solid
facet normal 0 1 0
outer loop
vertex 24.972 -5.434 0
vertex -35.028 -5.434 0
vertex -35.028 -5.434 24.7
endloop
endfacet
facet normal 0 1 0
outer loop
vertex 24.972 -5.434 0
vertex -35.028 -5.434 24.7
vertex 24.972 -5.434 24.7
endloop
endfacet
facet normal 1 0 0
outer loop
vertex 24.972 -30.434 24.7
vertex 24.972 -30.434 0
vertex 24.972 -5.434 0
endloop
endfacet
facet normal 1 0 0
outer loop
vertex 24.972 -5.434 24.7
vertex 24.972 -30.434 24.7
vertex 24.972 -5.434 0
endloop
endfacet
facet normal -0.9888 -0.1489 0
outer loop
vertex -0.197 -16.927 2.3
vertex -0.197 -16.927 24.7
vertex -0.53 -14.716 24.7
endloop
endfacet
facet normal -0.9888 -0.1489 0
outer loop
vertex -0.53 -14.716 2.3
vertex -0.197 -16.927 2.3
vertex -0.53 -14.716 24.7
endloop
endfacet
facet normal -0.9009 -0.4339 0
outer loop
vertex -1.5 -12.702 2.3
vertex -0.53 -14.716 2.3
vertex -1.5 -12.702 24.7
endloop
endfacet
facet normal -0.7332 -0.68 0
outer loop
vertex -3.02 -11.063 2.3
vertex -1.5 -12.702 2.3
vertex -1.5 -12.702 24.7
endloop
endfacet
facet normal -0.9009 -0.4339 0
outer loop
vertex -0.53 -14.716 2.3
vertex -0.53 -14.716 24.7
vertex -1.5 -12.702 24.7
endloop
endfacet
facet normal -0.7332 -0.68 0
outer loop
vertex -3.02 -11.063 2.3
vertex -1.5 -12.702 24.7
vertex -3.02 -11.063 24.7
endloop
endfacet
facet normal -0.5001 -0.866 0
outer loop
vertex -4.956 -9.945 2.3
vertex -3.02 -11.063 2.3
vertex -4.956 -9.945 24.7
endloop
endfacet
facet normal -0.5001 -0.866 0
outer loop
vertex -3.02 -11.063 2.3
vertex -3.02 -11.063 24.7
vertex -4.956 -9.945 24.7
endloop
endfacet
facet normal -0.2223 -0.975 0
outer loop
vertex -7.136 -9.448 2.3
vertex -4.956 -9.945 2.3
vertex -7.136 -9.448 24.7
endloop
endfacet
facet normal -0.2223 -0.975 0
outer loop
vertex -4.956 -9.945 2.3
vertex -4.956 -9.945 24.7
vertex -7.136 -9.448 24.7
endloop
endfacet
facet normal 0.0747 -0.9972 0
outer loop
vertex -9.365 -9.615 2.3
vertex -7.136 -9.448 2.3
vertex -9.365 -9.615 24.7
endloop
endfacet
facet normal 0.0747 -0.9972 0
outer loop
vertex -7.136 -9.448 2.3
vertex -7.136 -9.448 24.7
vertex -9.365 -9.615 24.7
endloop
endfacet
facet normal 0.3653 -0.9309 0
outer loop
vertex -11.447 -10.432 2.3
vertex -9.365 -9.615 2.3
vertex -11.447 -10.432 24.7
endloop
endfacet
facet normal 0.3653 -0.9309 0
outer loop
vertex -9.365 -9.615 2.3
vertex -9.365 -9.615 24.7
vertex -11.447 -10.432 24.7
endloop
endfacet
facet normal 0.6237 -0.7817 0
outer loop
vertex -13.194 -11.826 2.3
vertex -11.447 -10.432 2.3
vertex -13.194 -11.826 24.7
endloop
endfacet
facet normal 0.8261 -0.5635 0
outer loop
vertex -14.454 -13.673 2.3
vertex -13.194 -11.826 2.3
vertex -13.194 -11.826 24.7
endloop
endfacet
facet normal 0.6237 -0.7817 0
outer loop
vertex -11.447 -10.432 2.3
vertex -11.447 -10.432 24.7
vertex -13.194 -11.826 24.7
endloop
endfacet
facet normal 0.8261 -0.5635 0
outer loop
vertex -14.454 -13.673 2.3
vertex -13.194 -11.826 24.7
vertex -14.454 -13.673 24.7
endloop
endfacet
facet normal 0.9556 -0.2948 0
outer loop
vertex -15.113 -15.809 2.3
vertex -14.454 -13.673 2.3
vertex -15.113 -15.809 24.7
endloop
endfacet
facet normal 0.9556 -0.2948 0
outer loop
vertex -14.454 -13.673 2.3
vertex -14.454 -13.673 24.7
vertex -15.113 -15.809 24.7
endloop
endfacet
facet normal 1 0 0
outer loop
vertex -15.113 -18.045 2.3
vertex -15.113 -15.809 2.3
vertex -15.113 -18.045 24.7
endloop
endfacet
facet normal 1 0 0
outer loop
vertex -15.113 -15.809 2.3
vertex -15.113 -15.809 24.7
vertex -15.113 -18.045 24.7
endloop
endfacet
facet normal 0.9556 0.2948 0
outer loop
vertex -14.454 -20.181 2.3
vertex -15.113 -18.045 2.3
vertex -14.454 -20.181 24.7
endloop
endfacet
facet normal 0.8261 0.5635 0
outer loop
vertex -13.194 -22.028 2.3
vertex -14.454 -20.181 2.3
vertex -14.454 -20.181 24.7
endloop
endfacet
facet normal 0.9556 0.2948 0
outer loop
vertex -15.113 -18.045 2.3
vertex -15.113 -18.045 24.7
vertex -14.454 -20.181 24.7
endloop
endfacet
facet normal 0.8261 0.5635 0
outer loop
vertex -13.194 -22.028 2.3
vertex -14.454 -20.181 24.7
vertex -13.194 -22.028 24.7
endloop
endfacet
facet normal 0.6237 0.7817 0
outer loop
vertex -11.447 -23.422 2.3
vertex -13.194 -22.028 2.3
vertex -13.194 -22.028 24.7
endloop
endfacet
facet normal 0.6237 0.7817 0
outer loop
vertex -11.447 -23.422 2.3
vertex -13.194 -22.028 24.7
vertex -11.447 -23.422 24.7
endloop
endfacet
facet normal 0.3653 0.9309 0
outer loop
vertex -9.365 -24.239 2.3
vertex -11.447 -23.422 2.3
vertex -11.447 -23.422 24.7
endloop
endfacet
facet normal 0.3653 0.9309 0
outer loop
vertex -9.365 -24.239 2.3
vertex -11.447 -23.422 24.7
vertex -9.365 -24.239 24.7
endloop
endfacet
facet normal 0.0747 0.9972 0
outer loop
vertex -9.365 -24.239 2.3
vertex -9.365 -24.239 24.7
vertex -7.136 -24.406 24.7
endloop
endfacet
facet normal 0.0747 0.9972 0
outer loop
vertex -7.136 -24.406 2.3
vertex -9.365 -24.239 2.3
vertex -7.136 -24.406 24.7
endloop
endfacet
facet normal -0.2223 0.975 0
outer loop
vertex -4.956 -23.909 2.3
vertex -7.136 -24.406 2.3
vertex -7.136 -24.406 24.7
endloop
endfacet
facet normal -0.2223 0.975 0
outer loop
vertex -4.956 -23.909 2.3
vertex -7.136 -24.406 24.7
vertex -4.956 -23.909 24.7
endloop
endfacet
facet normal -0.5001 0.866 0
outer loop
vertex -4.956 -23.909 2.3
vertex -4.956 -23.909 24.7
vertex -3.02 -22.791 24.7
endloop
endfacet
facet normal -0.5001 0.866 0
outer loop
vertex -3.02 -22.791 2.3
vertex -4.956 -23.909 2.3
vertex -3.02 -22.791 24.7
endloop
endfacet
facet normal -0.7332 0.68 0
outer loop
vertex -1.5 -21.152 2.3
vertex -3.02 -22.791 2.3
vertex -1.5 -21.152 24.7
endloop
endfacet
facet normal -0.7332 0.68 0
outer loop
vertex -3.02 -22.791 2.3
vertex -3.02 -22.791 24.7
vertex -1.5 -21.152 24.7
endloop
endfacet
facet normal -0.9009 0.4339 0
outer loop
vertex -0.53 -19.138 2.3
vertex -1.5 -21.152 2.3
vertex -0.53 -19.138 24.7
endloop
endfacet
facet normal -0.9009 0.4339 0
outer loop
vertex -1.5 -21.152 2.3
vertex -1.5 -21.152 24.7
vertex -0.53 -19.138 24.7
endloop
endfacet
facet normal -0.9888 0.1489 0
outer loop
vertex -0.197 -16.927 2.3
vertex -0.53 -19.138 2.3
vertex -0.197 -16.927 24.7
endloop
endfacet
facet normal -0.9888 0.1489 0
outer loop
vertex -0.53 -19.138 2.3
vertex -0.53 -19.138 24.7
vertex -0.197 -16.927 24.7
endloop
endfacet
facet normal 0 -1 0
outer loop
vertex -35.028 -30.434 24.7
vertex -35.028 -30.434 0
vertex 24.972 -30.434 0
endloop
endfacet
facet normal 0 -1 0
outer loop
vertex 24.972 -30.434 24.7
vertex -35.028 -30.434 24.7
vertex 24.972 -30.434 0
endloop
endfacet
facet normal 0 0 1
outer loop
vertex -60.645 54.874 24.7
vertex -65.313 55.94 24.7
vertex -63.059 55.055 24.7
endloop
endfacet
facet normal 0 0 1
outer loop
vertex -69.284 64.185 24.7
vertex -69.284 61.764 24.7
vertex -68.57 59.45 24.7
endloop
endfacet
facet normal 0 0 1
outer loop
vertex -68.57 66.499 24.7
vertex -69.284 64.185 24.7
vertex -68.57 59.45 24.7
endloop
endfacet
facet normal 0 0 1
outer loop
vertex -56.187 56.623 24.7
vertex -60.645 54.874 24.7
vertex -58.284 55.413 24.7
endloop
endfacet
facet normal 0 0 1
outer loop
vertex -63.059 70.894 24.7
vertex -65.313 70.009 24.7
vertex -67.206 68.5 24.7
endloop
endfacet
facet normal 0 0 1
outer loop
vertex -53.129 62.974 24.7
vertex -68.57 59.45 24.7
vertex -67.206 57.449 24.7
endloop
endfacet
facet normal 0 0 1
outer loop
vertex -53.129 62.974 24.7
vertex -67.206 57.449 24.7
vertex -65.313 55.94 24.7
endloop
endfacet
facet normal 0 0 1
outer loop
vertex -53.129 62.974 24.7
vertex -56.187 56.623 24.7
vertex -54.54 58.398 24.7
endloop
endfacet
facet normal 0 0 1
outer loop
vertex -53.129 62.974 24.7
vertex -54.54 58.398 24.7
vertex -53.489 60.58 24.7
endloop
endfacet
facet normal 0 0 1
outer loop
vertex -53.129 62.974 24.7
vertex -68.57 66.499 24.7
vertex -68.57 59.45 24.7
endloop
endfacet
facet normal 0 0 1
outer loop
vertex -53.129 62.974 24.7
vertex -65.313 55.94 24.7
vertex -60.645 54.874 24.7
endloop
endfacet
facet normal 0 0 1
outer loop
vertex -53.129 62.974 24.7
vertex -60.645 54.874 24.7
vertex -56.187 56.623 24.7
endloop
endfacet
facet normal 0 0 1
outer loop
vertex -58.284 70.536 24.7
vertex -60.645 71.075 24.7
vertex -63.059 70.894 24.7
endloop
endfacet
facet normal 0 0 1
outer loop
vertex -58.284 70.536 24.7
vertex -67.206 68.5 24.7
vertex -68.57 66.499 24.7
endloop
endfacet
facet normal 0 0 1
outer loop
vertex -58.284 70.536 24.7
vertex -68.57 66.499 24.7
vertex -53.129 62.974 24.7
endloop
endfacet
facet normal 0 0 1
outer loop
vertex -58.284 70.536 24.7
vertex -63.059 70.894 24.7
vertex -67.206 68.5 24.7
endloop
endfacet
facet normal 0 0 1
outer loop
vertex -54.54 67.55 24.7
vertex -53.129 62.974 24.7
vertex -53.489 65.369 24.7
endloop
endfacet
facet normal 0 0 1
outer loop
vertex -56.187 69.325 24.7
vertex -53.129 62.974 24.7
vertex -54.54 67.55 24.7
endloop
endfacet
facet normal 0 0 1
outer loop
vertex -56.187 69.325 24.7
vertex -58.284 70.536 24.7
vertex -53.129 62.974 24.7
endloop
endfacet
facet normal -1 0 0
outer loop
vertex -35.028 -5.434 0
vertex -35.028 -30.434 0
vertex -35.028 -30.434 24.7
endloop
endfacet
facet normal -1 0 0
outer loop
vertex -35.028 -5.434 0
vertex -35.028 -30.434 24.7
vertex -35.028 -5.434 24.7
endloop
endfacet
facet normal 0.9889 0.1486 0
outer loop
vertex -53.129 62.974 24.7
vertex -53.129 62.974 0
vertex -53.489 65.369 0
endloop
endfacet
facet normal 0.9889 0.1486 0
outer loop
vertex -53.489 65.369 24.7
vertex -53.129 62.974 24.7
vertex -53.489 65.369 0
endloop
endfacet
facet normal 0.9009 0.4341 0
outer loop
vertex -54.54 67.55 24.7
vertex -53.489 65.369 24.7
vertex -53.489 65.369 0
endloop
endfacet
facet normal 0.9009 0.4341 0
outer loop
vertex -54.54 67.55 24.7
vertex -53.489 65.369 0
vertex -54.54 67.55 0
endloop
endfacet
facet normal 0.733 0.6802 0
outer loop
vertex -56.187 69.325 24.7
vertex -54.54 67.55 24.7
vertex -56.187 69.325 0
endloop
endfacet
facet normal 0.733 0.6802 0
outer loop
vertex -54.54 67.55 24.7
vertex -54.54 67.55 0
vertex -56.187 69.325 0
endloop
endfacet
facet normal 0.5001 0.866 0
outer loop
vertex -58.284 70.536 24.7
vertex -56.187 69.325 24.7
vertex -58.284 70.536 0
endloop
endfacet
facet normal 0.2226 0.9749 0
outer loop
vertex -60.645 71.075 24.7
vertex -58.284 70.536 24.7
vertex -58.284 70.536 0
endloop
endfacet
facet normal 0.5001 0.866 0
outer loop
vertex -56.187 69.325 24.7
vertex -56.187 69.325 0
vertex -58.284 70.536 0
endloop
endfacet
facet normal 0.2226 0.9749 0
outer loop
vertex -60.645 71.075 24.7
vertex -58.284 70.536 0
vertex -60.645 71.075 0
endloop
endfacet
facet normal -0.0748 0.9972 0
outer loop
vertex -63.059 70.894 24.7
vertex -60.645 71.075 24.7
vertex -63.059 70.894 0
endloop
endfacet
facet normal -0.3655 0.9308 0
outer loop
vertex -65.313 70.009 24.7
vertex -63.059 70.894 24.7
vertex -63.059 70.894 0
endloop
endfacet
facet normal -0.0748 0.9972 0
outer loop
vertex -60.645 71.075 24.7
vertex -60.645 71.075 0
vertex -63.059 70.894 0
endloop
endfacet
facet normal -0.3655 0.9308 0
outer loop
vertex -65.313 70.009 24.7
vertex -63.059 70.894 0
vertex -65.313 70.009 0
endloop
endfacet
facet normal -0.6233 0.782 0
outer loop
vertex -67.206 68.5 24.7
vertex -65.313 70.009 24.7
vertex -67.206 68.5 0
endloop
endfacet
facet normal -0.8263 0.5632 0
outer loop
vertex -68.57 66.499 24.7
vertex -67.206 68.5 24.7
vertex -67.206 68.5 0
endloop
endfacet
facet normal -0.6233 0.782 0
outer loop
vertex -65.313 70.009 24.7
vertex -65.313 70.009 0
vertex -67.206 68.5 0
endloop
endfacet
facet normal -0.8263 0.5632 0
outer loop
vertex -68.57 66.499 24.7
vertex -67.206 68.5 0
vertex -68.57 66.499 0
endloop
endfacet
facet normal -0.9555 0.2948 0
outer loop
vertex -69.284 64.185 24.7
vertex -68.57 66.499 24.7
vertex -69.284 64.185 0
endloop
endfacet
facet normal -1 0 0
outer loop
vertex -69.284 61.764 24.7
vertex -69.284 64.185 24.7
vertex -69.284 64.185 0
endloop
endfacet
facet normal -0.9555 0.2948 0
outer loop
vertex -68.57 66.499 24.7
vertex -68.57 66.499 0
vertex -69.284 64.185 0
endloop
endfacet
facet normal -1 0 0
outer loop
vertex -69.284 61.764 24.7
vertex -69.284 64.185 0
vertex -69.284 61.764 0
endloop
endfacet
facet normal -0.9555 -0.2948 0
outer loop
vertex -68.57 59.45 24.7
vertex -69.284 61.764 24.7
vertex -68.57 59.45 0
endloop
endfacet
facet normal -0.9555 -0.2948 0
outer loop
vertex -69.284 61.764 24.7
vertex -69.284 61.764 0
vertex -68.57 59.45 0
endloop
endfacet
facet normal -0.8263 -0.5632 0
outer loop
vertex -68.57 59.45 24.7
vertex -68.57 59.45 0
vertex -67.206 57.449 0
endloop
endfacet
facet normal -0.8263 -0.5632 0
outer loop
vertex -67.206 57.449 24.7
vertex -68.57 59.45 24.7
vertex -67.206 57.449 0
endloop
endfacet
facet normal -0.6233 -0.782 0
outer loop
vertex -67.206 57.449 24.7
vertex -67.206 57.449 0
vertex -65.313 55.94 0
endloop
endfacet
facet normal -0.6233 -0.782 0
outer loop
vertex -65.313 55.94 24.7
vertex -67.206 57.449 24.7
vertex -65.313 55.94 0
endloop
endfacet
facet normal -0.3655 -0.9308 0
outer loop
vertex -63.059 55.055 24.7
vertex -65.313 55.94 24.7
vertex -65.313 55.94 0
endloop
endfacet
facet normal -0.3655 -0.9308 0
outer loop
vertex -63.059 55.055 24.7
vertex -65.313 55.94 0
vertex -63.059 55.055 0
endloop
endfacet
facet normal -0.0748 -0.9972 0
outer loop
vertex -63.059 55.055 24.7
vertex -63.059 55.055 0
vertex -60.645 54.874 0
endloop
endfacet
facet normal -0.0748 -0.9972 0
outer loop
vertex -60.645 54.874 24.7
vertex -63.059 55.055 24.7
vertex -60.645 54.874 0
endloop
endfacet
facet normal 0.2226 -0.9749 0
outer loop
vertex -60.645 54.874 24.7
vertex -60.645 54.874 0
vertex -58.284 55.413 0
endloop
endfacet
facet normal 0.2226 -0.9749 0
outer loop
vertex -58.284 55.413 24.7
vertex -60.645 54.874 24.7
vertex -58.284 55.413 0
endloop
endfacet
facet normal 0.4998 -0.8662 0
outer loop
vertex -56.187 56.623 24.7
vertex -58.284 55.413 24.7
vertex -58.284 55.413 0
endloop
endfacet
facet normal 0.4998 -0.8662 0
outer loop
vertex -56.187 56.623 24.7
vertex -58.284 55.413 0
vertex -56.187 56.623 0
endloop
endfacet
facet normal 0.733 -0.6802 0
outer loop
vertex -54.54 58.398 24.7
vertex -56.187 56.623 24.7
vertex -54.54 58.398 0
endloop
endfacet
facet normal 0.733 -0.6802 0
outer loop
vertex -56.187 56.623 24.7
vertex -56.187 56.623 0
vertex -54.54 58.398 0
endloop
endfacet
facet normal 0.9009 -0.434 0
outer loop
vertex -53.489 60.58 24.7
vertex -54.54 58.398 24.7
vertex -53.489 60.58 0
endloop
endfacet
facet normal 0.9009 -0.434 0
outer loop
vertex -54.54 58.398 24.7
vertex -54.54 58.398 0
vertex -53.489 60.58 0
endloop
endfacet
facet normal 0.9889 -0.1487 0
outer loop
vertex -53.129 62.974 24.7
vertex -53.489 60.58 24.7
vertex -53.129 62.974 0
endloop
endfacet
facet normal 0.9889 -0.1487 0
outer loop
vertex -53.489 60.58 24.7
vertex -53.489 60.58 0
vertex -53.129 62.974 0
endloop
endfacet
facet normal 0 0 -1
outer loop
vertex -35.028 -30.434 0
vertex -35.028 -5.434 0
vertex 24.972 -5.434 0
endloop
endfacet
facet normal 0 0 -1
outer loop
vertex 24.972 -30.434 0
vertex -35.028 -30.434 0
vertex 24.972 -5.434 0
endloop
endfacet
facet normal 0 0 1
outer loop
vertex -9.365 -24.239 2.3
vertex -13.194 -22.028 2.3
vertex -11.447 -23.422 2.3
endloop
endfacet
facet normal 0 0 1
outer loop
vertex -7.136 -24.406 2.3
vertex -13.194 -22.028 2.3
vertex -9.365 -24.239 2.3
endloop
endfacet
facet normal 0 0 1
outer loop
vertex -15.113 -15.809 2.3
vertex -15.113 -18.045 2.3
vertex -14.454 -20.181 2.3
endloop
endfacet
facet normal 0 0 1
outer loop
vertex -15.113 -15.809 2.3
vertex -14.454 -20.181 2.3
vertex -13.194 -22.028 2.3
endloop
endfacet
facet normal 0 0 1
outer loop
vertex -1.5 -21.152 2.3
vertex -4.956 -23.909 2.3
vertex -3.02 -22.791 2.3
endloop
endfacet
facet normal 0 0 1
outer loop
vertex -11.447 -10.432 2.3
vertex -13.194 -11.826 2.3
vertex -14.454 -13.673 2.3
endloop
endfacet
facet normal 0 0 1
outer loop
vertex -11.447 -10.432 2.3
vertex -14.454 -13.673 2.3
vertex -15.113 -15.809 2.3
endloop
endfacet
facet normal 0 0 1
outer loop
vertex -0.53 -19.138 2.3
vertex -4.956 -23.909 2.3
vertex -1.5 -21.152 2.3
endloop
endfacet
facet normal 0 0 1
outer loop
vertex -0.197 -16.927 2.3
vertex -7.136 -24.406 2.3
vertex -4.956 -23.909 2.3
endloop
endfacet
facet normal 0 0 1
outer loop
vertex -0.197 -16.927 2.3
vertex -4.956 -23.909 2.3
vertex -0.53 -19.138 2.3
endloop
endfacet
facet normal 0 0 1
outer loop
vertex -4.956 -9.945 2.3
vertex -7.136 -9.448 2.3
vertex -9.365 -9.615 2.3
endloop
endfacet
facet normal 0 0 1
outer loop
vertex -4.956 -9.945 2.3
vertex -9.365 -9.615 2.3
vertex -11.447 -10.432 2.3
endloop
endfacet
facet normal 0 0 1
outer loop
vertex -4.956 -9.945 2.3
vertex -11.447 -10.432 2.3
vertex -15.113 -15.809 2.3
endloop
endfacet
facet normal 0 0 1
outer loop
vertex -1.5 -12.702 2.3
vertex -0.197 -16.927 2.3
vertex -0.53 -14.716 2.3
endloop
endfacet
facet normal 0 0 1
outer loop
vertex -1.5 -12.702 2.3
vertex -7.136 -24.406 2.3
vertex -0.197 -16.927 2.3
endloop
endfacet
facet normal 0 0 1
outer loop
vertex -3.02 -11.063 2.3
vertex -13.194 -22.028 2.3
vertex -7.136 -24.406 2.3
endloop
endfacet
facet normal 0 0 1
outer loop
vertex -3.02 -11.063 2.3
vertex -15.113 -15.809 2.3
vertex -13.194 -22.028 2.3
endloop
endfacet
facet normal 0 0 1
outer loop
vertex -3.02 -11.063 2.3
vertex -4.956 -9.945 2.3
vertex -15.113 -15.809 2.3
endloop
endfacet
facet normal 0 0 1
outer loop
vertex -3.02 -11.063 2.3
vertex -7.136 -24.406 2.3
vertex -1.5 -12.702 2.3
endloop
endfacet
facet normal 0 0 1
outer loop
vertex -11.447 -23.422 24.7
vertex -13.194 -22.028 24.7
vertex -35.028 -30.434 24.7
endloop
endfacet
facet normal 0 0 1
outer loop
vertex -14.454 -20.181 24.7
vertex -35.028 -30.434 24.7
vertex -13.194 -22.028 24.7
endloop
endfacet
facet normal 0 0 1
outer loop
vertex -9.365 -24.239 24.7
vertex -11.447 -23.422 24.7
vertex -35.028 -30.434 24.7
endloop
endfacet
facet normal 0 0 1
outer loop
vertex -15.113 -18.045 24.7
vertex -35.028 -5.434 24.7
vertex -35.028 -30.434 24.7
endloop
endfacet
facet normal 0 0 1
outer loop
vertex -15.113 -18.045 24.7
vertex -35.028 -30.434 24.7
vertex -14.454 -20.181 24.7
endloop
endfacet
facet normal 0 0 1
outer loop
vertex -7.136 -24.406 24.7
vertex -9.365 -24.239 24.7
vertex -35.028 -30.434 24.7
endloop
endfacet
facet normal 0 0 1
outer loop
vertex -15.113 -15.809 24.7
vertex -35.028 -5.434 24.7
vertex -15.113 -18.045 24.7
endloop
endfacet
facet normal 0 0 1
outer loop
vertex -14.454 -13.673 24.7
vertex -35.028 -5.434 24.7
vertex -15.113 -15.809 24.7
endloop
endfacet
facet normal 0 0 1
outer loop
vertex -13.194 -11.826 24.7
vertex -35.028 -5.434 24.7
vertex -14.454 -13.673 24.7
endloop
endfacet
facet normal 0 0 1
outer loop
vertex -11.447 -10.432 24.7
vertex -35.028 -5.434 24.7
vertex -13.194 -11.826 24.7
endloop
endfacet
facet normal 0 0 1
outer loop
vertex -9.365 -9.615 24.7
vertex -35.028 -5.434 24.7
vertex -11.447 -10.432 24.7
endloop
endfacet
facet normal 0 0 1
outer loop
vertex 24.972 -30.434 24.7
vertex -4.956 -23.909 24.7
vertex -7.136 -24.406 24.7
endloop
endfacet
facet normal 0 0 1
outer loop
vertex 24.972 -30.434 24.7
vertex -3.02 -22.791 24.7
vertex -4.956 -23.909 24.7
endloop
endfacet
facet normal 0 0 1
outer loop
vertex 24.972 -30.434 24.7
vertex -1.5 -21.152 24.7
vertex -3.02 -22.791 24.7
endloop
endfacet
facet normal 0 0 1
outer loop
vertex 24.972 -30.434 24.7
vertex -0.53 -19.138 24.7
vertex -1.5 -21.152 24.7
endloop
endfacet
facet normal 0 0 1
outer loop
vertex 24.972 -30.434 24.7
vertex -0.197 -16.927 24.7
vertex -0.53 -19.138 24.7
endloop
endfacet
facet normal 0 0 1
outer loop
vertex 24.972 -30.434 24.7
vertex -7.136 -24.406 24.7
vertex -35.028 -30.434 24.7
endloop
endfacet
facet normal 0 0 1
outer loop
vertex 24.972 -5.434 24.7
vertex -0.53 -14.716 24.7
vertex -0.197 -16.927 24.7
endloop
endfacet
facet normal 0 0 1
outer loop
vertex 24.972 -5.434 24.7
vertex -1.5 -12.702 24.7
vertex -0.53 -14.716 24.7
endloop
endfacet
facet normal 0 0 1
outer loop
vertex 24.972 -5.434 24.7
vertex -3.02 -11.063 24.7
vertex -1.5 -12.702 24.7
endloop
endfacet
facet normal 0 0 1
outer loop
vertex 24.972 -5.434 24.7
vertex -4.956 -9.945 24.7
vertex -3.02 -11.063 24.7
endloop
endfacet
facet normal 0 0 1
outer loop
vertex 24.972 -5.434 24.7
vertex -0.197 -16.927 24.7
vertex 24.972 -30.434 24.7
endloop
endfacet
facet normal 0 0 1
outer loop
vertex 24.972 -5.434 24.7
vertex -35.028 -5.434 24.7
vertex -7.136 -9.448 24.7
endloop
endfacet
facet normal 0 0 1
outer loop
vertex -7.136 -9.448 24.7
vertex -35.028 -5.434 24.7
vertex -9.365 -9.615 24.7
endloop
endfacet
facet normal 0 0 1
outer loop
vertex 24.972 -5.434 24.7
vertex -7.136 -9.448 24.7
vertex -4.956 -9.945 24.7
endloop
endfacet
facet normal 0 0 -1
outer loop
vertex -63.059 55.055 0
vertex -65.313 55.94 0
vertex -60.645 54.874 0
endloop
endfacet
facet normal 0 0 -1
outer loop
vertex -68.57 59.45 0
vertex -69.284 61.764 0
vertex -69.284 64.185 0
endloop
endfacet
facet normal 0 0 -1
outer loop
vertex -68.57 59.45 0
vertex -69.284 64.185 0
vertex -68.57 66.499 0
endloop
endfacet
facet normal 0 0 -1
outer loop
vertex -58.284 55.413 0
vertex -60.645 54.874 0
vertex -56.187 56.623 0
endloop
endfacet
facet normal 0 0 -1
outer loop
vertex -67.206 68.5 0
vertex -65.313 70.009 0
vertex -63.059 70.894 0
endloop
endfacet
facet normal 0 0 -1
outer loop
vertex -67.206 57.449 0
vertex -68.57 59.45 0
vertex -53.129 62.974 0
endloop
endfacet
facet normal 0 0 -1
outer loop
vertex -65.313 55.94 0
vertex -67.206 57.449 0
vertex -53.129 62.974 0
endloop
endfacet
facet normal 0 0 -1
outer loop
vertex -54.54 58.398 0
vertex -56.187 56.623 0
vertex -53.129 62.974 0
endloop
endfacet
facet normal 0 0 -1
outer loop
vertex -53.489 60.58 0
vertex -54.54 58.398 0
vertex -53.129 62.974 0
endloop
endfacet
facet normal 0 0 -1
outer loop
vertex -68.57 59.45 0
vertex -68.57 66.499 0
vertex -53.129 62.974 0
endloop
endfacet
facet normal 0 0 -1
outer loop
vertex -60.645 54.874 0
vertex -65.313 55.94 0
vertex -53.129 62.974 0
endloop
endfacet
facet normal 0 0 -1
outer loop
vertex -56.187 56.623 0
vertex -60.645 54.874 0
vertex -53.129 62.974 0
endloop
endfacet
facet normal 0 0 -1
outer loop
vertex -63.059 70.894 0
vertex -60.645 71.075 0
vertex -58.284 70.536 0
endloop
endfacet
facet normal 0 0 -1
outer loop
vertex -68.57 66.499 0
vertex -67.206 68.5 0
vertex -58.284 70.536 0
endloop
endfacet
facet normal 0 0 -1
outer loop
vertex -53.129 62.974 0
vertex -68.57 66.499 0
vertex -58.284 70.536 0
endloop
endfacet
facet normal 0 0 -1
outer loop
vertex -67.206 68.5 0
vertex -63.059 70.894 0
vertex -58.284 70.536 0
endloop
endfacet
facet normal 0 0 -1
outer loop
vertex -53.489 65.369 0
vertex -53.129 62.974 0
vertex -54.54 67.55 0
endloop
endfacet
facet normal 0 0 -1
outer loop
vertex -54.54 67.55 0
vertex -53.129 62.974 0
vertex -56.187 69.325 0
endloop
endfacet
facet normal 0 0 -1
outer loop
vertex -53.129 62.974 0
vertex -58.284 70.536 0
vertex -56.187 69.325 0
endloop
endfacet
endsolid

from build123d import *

# Parameters (mm, degrees)
F0_W     = 60
F0_H     = 25
F0_R     = 8.123158
F1_DEPTH = 24.7
F2_R     = 7.5
F3_DEPTH = 22.4


with BuildPart() as f1:
    # F0 (on Top) → F1 (new body)
    with BuildSketch(Plane.XY):
        with Locations((-5.028301, -17.934426)):
            Rectangle(F0_W, F0_H)
        with Locations((-61.251678, 62.974378)):
            Circle(F0_R)
    extrude(amount=F1_DEPTH)

    # F2 (on face) → F3 (cut)
    with BuildSketch(Plane.XY.offset(24.7)):
        with Locations((-7.696549, -16.927)):
            Circle(F2_R)
    extrude(amount=-F3_DEPTH, mode=Mode.SUBTRACT)


solid = f1.part
